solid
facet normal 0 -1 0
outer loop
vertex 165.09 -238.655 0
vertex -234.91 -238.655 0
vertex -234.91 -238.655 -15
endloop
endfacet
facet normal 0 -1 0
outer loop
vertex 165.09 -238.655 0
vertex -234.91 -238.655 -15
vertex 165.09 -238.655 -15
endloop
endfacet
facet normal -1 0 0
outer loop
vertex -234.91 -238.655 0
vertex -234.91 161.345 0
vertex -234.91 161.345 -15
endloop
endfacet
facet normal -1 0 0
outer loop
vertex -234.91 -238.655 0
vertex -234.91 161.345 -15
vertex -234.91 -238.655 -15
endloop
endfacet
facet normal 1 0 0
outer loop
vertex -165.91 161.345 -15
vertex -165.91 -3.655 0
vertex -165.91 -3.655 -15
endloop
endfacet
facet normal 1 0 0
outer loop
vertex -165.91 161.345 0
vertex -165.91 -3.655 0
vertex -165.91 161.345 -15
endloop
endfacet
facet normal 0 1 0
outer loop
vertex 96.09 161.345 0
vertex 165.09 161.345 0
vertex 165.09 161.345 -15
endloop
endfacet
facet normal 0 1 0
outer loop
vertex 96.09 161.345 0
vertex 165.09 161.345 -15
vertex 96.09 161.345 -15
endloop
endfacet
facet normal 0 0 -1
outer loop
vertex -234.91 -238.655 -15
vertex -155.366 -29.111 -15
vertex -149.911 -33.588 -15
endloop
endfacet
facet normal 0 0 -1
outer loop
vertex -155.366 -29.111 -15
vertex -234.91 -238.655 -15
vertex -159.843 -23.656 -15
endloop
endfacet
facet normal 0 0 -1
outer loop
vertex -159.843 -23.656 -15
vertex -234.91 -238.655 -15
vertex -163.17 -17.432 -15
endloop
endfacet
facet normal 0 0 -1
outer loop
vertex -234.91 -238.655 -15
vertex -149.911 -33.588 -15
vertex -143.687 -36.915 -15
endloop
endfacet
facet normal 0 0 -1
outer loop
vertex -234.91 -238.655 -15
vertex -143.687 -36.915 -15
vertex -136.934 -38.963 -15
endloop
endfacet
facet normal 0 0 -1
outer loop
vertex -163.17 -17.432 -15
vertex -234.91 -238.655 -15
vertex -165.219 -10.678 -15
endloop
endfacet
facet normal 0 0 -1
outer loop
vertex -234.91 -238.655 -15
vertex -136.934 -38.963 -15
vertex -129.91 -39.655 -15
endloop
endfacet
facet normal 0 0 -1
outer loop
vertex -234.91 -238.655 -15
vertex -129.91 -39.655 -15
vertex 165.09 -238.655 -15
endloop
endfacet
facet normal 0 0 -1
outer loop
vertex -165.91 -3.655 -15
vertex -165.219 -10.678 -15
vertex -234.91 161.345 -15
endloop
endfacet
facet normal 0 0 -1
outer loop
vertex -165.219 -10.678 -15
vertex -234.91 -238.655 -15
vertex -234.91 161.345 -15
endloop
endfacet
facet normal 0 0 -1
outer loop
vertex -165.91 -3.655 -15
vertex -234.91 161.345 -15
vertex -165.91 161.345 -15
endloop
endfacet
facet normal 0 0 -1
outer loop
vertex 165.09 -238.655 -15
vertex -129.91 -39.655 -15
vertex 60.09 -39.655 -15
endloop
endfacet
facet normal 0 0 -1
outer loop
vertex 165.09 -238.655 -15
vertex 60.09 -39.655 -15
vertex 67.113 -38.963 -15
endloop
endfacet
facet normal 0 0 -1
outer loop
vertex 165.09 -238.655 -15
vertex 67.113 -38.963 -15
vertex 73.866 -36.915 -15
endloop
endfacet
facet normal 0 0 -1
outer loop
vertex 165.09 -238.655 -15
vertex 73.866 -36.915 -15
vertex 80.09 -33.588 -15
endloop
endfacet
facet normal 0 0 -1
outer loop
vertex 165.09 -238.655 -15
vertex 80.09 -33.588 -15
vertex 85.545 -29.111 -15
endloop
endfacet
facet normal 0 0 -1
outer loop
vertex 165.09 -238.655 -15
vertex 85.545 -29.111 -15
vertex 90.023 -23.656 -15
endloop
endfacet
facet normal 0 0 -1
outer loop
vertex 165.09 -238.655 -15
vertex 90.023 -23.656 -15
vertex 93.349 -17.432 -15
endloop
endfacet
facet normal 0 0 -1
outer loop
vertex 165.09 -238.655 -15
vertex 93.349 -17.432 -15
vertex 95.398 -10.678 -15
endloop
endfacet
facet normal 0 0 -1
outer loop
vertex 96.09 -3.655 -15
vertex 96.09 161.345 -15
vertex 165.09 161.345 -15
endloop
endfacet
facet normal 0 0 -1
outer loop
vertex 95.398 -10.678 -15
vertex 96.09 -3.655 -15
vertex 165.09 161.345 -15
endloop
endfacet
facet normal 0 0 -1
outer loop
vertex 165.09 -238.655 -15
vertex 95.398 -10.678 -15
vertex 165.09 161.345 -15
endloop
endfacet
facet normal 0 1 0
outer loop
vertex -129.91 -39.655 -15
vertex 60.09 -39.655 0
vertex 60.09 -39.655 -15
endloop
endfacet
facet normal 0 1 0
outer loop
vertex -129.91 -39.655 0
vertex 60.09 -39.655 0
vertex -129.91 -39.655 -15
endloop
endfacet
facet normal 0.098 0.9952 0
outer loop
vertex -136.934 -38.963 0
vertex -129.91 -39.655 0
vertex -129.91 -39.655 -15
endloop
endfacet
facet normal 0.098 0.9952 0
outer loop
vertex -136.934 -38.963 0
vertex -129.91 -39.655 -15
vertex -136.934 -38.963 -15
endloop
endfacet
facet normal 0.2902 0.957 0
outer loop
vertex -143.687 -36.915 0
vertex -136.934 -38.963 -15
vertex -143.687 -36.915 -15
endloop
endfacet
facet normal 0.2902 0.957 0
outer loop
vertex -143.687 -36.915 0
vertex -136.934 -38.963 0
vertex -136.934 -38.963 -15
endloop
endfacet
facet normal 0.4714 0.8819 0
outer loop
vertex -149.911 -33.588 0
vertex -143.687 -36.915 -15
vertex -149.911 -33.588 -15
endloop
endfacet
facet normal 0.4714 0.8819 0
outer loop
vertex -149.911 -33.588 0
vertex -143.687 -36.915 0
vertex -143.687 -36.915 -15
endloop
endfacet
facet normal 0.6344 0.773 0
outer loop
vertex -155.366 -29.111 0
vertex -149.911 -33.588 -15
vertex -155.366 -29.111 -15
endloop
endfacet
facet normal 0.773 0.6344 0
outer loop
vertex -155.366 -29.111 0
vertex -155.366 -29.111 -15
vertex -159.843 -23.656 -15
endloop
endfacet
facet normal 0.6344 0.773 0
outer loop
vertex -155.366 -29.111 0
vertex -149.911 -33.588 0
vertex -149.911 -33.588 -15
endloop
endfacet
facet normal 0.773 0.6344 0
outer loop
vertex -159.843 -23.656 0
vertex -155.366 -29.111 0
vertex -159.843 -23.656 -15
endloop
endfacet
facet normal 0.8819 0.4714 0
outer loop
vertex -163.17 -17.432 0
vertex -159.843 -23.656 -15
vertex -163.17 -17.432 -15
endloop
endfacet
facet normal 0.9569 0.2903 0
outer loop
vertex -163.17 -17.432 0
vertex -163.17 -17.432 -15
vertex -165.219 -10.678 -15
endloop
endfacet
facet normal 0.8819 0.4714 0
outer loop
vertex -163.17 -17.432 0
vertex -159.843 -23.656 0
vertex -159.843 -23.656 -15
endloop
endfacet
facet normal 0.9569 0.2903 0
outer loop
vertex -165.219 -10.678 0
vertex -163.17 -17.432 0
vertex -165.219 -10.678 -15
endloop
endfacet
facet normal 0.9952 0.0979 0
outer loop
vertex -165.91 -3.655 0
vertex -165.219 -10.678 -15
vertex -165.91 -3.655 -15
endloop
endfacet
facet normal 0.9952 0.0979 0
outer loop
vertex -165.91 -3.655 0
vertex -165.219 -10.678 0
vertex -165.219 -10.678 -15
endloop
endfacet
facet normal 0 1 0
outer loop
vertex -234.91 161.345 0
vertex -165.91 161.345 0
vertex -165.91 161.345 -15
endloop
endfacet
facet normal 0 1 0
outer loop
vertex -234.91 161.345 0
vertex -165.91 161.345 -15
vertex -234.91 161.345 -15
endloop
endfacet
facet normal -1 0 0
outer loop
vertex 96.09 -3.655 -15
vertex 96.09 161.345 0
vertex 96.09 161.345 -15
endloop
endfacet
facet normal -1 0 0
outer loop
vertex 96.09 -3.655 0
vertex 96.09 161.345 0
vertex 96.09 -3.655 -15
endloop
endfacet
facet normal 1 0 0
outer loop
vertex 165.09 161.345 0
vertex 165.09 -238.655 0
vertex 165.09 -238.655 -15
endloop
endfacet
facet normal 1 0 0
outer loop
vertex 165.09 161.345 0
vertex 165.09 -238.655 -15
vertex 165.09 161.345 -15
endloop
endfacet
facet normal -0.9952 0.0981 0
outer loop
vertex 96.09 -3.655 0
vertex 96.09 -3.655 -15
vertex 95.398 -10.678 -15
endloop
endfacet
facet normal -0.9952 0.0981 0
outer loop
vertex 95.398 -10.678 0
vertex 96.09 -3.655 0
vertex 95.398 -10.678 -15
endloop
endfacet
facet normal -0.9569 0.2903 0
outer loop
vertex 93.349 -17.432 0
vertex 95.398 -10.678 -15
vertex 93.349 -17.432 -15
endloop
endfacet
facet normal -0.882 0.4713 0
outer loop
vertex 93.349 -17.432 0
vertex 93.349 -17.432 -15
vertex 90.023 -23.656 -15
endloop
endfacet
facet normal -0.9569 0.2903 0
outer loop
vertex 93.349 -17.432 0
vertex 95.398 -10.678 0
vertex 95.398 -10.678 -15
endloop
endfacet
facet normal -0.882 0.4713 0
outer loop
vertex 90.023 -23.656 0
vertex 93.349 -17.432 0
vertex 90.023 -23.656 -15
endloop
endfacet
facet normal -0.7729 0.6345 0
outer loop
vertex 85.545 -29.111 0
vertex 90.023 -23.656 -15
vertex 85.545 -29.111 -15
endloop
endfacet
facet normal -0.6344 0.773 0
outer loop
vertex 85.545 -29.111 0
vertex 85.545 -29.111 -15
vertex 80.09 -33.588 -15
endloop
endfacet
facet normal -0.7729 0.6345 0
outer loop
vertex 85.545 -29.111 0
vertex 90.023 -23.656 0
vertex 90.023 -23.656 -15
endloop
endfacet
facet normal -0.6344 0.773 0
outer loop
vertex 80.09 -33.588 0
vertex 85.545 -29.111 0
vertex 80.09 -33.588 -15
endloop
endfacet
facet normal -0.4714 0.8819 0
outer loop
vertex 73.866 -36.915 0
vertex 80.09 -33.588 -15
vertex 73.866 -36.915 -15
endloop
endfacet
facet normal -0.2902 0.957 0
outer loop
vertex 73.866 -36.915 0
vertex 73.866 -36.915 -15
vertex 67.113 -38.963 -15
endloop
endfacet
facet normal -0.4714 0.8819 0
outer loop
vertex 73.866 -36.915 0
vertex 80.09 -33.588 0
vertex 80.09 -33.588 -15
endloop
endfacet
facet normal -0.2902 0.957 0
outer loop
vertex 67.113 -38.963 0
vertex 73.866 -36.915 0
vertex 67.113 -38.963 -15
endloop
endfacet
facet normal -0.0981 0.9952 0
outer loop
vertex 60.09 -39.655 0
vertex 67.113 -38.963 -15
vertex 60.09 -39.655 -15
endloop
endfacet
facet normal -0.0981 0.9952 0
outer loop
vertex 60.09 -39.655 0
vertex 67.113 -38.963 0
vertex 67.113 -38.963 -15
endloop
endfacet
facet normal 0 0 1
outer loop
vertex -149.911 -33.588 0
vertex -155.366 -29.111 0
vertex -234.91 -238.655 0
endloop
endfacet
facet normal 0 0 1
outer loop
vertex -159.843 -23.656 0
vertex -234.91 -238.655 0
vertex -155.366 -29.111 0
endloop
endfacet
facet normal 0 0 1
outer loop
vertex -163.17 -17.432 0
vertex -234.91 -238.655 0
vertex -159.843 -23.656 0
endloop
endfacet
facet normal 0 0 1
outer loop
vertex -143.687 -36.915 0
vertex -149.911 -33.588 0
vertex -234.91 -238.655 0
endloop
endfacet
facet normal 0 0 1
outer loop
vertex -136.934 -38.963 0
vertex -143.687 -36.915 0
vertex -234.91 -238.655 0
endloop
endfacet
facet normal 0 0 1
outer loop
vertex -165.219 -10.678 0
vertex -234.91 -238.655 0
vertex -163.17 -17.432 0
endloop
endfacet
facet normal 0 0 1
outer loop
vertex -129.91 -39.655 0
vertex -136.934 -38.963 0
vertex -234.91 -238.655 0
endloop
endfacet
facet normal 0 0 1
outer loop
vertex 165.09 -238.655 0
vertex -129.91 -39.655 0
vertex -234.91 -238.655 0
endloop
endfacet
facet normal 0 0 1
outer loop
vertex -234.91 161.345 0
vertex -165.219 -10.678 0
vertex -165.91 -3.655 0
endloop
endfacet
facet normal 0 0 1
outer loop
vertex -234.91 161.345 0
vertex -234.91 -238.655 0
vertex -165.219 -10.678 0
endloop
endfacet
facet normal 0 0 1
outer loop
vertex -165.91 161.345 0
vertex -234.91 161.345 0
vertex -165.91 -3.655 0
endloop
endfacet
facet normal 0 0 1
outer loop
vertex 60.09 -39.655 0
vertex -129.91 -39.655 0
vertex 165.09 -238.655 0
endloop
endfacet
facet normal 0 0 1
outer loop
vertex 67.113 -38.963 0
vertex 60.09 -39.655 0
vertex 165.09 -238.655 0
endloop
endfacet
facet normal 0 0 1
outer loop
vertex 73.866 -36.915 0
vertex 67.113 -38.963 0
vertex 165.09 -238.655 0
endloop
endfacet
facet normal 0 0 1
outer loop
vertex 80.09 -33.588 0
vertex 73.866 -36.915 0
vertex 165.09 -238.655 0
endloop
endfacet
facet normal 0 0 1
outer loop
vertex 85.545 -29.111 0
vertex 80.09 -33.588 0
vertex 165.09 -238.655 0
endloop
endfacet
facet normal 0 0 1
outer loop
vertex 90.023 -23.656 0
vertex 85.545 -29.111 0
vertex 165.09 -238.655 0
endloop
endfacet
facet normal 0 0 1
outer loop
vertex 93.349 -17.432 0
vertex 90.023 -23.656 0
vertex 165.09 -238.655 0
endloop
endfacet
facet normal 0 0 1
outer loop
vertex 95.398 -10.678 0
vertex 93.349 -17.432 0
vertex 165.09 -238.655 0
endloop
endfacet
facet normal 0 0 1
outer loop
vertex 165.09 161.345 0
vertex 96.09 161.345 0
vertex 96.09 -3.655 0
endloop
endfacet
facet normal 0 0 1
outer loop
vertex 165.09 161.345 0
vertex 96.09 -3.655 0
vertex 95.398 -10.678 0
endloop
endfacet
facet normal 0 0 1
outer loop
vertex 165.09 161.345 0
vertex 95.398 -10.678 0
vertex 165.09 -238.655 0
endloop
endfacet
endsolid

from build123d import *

# Parameters (mm, degrees)
TABAN_FLAN_1_DEPTH = 15


# Sheet-metal steps are written as plain solids
with BuildPart() as part:
    # Çizim1 → Taban-Flanş1 (new body)
    with BuildSketch(Plane.XY):
        with BuildLine():
            Line((-234.910345825, 161.344850299), (-234.910345825, -238.655149701))
            Line((-234.910345825, -238.655149701), (165.089654175, -238.655149701))
            Line((165.089654175, -238.655149701), (165.089654175, 161.344850299))
            Line((165.089654175, 161.344850299), (96.089654175, 161.344850299))
            Line((96.089654175, 161.344850299), (96.089654175, -3.655149701))
            ThreePointArc((96.089654175, -3.655149701), (85.545498298, -29.110993823), (60.089654175, -39.655149701))
            Line((60.089654175, -39.655149701), (-129.910345825, -39.655149701))
            ThreePointArc((-129.910345825, -39.655149701), (-155.366189948, -29.110993823), (-165.910345825, -3.655149701))
            Line((-165.910345825, -3.655149701), (-165.910345825, 161.344850299))
            Line((-165.910345825, 161.344850299), (-234.910345825, 161.344850299))
        make_face()
    extrude(amount=-TABAN_FLAN_1_DEPTH)


solid = part.part
